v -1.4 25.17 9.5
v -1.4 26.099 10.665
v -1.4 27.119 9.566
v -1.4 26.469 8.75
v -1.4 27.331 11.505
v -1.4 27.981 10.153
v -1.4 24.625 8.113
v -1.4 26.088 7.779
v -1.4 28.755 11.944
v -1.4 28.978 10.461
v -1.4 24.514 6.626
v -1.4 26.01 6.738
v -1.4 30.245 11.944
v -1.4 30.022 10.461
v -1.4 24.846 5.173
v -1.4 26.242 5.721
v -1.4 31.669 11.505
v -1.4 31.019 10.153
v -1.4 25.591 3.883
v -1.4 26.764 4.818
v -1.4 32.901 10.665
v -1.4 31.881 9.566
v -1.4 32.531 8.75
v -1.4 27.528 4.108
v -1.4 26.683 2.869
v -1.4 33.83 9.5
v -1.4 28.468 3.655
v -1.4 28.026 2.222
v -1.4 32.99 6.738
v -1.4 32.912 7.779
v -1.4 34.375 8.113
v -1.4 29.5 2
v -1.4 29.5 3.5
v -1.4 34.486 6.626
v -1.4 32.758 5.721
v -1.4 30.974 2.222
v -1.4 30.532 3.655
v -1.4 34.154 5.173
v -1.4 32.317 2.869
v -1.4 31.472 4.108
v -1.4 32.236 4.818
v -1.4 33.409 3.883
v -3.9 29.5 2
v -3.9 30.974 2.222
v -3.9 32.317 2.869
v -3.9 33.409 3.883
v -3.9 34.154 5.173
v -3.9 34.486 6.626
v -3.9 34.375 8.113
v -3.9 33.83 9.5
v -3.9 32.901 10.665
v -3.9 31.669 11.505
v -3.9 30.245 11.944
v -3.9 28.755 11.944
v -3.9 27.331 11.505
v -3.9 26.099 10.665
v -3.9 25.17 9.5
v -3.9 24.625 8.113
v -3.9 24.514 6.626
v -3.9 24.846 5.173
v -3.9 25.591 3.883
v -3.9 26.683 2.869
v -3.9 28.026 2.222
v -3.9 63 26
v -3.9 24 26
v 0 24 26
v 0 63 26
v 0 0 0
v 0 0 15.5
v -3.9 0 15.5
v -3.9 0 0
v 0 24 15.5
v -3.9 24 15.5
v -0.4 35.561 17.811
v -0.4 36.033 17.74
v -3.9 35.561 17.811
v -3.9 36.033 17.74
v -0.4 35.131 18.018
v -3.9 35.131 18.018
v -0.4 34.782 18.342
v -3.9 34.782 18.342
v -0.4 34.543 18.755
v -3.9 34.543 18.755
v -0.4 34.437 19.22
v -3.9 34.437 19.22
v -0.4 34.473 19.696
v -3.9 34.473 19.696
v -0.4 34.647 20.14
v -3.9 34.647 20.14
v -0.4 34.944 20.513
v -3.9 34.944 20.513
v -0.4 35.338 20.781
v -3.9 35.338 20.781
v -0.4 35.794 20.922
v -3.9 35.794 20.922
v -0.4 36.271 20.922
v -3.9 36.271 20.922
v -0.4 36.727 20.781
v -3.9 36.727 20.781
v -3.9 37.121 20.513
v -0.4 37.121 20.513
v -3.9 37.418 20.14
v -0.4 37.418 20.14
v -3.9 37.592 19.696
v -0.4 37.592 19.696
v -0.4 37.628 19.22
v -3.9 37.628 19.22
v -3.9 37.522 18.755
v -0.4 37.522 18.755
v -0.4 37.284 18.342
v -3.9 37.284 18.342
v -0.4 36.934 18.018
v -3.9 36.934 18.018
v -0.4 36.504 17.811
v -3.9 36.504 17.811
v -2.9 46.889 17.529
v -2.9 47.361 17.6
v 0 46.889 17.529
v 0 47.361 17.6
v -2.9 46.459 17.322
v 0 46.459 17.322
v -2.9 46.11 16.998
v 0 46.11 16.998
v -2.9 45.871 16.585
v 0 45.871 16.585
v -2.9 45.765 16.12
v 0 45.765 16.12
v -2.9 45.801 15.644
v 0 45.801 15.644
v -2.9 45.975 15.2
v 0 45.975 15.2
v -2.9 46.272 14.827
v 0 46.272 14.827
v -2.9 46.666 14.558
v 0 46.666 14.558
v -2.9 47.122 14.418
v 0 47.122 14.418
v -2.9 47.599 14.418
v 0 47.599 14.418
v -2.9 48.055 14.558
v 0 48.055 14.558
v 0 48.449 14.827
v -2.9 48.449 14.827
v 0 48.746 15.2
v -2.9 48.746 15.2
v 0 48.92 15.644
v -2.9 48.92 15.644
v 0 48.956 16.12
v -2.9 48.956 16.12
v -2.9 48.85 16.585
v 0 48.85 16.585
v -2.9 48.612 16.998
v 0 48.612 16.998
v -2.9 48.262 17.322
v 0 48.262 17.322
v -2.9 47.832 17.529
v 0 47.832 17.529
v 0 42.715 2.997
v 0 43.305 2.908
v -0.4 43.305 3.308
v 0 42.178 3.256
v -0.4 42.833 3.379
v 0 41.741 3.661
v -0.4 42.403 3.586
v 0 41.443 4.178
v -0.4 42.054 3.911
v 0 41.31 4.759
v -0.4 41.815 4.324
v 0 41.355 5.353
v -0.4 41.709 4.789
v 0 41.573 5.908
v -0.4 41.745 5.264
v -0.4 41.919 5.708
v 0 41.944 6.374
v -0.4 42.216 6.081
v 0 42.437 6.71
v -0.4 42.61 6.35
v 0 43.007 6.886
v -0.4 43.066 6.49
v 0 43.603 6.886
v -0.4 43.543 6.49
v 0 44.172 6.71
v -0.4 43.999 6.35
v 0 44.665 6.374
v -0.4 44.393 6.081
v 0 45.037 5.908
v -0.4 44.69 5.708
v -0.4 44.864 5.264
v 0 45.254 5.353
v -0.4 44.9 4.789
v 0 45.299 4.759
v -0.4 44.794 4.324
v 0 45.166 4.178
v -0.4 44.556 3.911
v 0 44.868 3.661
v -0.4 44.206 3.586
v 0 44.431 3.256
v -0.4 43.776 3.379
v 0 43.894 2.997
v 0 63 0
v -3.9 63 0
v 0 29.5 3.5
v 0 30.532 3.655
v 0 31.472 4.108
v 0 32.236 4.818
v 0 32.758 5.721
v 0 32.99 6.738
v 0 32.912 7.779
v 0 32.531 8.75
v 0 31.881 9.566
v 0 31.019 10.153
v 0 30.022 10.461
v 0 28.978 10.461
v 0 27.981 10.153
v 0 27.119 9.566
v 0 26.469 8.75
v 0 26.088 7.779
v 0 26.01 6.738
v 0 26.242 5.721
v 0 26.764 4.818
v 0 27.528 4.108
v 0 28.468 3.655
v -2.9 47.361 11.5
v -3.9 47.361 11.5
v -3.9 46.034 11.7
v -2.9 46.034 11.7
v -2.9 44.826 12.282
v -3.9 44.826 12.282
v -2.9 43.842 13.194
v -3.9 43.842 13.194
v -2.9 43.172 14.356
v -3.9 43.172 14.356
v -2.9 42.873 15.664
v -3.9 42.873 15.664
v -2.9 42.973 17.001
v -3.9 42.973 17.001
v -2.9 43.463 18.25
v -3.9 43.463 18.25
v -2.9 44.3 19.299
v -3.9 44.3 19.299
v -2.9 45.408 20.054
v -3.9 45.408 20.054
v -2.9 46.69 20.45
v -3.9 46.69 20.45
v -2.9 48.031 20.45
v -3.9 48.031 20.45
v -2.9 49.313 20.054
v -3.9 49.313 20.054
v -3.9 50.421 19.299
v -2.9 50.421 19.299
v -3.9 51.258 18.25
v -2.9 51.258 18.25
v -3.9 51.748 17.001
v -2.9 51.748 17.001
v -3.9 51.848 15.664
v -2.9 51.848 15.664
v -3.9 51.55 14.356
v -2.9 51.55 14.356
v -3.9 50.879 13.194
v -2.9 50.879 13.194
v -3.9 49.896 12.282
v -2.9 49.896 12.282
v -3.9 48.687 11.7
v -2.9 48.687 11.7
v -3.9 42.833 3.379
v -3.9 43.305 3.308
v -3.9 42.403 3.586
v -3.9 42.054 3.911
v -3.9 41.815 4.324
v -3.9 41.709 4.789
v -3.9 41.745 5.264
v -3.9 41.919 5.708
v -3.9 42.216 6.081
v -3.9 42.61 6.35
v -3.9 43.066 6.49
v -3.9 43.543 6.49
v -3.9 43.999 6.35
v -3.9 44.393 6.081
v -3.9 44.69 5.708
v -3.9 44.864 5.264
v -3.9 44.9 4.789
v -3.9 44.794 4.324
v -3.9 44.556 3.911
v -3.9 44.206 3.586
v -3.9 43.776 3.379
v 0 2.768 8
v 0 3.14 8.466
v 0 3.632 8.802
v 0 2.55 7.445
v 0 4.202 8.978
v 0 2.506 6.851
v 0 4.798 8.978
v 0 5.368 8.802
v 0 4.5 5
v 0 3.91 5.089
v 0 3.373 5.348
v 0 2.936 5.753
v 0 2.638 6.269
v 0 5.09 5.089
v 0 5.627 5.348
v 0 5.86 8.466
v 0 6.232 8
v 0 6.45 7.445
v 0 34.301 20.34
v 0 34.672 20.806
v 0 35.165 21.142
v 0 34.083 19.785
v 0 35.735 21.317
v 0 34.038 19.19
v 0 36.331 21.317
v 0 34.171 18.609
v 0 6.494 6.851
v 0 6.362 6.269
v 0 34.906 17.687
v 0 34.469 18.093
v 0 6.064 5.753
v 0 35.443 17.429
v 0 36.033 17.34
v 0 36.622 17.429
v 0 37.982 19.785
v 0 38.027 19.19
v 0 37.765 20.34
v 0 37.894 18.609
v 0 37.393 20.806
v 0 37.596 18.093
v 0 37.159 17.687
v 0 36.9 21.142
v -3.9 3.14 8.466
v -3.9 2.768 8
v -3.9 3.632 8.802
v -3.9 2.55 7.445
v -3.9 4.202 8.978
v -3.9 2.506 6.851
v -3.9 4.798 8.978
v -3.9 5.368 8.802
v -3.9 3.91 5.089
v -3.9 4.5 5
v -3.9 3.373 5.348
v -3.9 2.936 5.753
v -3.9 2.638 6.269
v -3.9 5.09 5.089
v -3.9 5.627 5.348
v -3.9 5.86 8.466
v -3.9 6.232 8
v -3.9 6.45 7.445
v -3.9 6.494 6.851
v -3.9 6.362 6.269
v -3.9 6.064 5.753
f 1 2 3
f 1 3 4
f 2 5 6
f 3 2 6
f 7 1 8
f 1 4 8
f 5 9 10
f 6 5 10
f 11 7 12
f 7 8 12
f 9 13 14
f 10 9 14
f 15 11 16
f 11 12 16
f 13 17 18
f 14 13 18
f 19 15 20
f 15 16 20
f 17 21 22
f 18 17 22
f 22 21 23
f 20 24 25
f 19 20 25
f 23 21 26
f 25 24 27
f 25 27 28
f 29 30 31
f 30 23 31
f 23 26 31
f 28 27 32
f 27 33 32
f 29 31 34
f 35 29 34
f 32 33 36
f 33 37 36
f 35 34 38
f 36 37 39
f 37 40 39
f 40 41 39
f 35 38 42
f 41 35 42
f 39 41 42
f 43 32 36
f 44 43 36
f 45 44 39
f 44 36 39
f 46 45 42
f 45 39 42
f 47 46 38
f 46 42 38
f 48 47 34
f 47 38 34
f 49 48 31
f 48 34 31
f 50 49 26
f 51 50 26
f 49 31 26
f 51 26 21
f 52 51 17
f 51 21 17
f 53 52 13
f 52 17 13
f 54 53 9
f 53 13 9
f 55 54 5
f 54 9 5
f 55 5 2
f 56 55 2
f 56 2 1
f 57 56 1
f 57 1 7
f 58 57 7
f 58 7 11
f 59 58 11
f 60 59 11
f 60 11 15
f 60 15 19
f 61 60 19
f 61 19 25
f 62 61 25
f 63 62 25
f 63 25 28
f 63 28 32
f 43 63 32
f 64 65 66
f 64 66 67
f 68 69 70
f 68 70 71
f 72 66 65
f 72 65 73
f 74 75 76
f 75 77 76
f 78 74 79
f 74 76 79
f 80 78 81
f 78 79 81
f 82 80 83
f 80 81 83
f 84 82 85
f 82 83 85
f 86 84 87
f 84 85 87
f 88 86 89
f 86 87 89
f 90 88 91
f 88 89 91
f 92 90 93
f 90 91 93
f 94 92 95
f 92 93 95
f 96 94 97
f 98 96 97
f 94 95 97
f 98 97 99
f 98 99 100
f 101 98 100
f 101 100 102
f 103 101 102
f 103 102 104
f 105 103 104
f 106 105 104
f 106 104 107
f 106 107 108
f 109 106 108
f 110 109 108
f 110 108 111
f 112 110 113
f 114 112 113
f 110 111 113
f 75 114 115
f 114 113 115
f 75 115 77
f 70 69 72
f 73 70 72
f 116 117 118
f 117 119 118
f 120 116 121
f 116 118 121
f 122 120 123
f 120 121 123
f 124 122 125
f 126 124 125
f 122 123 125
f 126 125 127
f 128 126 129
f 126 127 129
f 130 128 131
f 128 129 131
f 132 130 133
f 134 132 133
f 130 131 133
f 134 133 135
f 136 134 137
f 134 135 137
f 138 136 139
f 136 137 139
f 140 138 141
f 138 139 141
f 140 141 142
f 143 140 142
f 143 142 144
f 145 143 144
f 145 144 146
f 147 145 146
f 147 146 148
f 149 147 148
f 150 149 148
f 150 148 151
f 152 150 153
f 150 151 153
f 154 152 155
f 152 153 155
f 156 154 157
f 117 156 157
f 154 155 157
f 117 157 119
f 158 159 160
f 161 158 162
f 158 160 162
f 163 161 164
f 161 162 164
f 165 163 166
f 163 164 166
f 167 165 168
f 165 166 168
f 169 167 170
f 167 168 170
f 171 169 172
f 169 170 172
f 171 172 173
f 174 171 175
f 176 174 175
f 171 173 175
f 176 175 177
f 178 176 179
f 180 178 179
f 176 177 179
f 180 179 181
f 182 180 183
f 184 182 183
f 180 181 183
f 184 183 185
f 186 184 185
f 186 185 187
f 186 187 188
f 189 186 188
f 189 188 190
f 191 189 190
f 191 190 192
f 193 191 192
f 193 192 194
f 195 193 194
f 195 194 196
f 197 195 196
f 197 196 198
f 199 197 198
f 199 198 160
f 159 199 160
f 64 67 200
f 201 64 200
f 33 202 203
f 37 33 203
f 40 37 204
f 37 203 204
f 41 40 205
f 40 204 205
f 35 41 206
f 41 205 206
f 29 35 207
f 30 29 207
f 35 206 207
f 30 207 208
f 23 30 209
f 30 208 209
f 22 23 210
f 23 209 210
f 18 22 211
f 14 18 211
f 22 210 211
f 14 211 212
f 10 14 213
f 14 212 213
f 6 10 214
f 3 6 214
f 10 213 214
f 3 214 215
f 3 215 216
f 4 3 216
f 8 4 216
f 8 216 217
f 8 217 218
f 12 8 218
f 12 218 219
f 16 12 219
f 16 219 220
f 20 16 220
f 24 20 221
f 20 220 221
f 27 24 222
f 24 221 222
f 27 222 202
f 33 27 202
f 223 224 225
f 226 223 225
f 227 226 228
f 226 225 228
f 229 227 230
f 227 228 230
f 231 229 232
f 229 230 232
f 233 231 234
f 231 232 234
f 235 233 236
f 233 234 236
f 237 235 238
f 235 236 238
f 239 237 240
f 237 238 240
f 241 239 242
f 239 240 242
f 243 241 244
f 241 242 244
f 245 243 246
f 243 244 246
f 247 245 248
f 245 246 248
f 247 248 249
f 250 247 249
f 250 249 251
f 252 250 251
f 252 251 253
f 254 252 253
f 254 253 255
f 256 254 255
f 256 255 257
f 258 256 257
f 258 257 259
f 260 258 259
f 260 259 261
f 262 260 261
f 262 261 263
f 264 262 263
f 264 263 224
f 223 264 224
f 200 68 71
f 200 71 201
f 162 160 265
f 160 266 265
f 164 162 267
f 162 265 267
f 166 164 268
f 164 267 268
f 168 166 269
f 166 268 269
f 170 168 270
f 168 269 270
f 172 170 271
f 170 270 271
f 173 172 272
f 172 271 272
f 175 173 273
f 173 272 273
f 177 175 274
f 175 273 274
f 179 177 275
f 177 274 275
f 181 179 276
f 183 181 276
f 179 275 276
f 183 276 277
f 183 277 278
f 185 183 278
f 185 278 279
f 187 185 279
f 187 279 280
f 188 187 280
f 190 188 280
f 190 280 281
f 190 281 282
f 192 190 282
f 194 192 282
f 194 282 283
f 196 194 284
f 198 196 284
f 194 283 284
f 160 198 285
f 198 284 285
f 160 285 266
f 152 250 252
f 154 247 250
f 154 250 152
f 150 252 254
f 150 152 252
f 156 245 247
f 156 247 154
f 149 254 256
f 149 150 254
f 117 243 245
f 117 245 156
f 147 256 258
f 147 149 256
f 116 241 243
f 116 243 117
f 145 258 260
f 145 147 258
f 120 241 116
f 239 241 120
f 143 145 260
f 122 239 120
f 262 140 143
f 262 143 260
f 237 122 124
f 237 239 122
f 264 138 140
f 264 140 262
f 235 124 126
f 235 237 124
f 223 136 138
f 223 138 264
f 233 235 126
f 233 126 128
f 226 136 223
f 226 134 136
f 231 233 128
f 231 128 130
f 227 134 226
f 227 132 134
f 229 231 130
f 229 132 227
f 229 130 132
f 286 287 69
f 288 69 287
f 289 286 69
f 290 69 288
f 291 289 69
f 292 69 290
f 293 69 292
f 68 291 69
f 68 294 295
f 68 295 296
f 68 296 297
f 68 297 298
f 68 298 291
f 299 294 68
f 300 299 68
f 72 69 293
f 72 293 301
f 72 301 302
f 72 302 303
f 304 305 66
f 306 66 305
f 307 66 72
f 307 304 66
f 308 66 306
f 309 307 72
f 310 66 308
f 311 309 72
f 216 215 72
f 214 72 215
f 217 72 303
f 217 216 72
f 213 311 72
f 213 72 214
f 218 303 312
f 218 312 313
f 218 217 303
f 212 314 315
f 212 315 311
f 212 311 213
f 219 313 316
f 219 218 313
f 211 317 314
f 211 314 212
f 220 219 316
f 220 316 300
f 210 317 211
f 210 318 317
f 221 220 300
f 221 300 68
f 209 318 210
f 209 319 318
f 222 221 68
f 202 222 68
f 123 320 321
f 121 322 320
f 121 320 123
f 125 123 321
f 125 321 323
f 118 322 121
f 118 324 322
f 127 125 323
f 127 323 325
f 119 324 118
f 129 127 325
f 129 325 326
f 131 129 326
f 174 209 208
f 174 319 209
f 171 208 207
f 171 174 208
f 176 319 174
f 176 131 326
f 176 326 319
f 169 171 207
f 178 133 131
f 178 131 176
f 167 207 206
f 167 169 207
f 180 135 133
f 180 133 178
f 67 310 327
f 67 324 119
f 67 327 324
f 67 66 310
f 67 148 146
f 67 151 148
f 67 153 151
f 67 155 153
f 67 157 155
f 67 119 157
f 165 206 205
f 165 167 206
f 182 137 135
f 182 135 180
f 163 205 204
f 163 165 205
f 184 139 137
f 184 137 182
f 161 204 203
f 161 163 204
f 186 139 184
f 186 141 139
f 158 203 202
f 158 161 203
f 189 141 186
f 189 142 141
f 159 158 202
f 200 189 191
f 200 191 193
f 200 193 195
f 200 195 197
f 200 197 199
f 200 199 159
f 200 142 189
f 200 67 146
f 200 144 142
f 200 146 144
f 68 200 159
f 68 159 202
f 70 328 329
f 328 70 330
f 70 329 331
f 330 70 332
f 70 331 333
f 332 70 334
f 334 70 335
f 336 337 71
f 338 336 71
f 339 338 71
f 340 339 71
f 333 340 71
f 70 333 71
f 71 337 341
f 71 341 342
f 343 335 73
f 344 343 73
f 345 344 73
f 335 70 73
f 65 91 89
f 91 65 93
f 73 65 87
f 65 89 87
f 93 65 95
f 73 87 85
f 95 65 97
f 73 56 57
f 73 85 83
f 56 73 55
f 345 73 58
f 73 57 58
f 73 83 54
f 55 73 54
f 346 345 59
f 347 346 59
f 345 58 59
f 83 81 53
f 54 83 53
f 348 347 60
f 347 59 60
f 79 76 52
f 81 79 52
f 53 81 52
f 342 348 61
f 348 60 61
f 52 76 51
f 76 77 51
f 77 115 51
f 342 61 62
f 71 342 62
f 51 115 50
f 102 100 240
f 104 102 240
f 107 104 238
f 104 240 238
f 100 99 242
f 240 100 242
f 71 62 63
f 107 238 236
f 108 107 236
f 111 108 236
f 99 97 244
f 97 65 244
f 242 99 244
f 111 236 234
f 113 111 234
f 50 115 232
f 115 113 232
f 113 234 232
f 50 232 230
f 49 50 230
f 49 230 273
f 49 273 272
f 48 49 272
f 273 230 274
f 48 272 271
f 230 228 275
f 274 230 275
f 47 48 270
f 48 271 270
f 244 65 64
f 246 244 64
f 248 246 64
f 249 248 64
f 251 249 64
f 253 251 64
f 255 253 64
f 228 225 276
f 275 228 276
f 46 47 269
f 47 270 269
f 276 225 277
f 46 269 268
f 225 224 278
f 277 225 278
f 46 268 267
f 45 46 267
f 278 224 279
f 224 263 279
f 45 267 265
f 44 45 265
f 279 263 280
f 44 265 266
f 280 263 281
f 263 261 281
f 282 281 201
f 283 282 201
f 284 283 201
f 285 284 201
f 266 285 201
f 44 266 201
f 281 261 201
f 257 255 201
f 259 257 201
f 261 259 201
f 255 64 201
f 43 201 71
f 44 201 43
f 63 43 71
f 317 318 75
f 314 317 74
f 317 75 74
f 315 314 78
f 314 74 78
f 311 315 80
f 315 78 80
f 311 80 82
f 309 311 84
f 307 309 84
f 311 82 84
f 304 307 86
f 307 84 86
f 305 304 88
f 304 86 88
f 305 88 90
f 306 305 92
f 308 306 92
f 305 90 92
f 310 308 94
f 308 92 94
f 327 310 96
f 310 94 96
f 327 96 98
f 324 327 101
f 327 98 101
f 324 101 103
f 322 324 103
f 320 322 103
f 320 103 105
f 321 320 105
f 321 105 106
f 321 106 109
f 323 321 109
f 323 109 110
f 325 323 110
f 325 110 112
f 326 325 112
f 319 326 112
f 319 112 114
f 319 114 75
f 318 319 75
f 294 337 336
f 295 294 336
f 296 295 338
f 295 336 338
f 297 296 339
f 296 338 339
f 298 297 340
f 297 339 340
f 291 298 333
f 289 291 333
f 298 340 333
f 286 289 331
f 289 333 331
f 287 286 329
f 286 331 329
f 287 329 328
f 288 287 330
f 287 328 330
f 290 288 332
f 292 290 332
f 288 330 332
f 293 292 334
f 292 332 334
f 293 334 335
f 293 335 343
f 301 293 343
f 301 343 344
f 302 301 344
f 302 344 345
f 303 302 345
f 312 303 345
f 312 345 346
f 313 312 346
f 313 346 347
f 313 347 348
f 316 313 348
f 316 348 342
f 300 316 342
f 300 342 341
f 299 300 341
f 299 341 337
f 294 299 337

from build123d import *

# Parameters (mm, degrees)
SKETCH1_W                                        = 30
SKETCH1_H                                        = 63
BOSS_EXTRUDE1_DEPTH                              = 3.9
SKETCH2_R                                        = 5
CUT_EXTRUDE1_DEPTH                               = 70.887123277
F_4_0_4_DIAMETER_HOLE1_D                         = 4
SKETCH12_W                                       = 14.5
SKETCH12_H                                       = 24
CUT_EXTRUDE2_DEPTH                               = 70.887123277
CBORE_FOR_M3_PAN_HEAD_MACHINE_SCREW2_D           = 3.2
CBORE_FOR_M3_PAN_HEAD_MACHINE_SCREW2_CBORE_D     = 9
CBORE_FOR_M3_PAN_HEAD_MACHINE_SCREW2_CBORE_DEPTH = 1
CSK_FOR_M3_FLAT_HEAD_MACHINE_SCREW1_D            = 3.2
CSK_FOR_M3_FLAT_HEAD_MACHINE_SCREW1_CSINK_D      = 4
CSK_FOR_M3_FLAT_HEAD_MACHINE_SCREW1_CSINK_ANGLE  = 90
SKETCH19_W                                       = 4
SKETCH19_H                                       = 39
CUT_EXTRUDE3_DEPTH                               = 70.887123277
SKETCH20_R                                       = 5
SKETCH20_R_2                                     = 3.5
BOSS_EXTRUDE2_DEPTH                              = 1.4


with BuildPart() as part:
    # Sketch1 → Boss-Extrude1 (new body)
    with BuildSketch(Plane(origin=(0, 0, 0), x_dir=(0, 0, -1), z_dir=(1, 0, 0))):
        with Locations((-15, 31.5)):
            Rectangle(SKETCH1_W, SKETCH1_H)
    extrude(amount=-BOSS_EXTRUDE1_DEPTH)

    # Sketch2 → Cut-Extrude1 (cut, through all)
    with BuildSketch(Plane(origin=(0, 0, 0), x_dir=(0, 0, -1), z_dir=(1, 0, 0))):
        with Locations((-7, 29.5)):
            Circle(SKETCH2_R)
    extrude(amount=-CUT_EXTRUDE1_DEPTH, mode=Mode.SUBTRACT)

    # Ø4.0 (4) Diameter Hole1 (through all)
    with Locations(Plane(origin=(0, 4.5, 7), x_dir=(0, 0, 1), z_dir=(1, 0, 0))):
        with Locations((0, 0)):
            Hole(F_4_0_4_DIAMETER_HOLE1_D / 2)

    # Sketch12 → Cut-Extrude2 (cut, through all)
    with BuildSketch(Plane(origin=(0, 0, 0), x_dir=(0, 0, -1), z_dir=(1, 0, 0))):
        with Locations((-22.75, 12)):
            Rectangle(SKETCH12_W, SKETCH12_H)
    extrude(amount=-CUT_EXTRUDE2_DEPTH, mode=Mode.SUBTRACT)

    # CBORE for M3 Pan Head Machine Screw2 (through all)
    with Locations(Plane(origin=(-3.9, 47.360571099, 16), x_dir=(0, 0, -1), z_dir=(-1, 0, 0))):
        with Locations((0, 0)):
            CounterBoreHole(CBORE_FOR_M3_PAN_HEAD_MACHINE_SCREW2_D / 2, CBORE_FOR_M3_PAN_HEAD_MACHINE_SCREW2_CBORE_D / 2, CBORE_FOR_M3_PAN_HEAD_MACHINE_SCREW2_CBORE_DEPTH)

    # CSK for M3 Flat Head Machine Screw1 (through all)
    with Locations(Plane(origin=(0, 36.032608687, 19.33966579), x_dir=(0, 0, 1), z_dir=(1, 0, 0))):
        with Locations((0, 0), (-14.431341448, -7.272)):
            CounterSinkHole(CSK_FOR_M3_FLAT_HEAD_MACHINE_SCREW1_D / 2, CSK_FOR_M3_FLAT_HEAD_MACHINE_SCREW1_CSINK_D / 2, counter_sink_angle=CSK_FOR_M3_FLAT_HEAD_MACHINE_SCREW1_CSINK_ANGLE)

    # Sketch19 → Cut-Extrude3 (cut, through all)
    with BuildSketch(Plane.ZY.offset(3.9)):
        with Locations((28, 43.5)):
            Rectangle(SKETCH19_W, SKETCH19_H)
    extrude(amount=-CUT_EXTRUDE3_DEPTH, mode=Mode.SUBTRACT)

    # Sketch20 → Boss-Extrude2 (add)
    with BuildSketch(Plane(origin=(0, 0, 0), x_dir=(0, 0, -1), z_dir=(1, 0, 0))):
        with Locations((-7, 29.5)):
            Circle(SKETCH20_R)
        with Locations((-7, 29.5)):
            Circle(SKETCH20_R_2, mode=Mode.SUBTRACT)
    extrude(amount=-BOSS_EXTRUDE2_DEPTH)


solid = part.part
